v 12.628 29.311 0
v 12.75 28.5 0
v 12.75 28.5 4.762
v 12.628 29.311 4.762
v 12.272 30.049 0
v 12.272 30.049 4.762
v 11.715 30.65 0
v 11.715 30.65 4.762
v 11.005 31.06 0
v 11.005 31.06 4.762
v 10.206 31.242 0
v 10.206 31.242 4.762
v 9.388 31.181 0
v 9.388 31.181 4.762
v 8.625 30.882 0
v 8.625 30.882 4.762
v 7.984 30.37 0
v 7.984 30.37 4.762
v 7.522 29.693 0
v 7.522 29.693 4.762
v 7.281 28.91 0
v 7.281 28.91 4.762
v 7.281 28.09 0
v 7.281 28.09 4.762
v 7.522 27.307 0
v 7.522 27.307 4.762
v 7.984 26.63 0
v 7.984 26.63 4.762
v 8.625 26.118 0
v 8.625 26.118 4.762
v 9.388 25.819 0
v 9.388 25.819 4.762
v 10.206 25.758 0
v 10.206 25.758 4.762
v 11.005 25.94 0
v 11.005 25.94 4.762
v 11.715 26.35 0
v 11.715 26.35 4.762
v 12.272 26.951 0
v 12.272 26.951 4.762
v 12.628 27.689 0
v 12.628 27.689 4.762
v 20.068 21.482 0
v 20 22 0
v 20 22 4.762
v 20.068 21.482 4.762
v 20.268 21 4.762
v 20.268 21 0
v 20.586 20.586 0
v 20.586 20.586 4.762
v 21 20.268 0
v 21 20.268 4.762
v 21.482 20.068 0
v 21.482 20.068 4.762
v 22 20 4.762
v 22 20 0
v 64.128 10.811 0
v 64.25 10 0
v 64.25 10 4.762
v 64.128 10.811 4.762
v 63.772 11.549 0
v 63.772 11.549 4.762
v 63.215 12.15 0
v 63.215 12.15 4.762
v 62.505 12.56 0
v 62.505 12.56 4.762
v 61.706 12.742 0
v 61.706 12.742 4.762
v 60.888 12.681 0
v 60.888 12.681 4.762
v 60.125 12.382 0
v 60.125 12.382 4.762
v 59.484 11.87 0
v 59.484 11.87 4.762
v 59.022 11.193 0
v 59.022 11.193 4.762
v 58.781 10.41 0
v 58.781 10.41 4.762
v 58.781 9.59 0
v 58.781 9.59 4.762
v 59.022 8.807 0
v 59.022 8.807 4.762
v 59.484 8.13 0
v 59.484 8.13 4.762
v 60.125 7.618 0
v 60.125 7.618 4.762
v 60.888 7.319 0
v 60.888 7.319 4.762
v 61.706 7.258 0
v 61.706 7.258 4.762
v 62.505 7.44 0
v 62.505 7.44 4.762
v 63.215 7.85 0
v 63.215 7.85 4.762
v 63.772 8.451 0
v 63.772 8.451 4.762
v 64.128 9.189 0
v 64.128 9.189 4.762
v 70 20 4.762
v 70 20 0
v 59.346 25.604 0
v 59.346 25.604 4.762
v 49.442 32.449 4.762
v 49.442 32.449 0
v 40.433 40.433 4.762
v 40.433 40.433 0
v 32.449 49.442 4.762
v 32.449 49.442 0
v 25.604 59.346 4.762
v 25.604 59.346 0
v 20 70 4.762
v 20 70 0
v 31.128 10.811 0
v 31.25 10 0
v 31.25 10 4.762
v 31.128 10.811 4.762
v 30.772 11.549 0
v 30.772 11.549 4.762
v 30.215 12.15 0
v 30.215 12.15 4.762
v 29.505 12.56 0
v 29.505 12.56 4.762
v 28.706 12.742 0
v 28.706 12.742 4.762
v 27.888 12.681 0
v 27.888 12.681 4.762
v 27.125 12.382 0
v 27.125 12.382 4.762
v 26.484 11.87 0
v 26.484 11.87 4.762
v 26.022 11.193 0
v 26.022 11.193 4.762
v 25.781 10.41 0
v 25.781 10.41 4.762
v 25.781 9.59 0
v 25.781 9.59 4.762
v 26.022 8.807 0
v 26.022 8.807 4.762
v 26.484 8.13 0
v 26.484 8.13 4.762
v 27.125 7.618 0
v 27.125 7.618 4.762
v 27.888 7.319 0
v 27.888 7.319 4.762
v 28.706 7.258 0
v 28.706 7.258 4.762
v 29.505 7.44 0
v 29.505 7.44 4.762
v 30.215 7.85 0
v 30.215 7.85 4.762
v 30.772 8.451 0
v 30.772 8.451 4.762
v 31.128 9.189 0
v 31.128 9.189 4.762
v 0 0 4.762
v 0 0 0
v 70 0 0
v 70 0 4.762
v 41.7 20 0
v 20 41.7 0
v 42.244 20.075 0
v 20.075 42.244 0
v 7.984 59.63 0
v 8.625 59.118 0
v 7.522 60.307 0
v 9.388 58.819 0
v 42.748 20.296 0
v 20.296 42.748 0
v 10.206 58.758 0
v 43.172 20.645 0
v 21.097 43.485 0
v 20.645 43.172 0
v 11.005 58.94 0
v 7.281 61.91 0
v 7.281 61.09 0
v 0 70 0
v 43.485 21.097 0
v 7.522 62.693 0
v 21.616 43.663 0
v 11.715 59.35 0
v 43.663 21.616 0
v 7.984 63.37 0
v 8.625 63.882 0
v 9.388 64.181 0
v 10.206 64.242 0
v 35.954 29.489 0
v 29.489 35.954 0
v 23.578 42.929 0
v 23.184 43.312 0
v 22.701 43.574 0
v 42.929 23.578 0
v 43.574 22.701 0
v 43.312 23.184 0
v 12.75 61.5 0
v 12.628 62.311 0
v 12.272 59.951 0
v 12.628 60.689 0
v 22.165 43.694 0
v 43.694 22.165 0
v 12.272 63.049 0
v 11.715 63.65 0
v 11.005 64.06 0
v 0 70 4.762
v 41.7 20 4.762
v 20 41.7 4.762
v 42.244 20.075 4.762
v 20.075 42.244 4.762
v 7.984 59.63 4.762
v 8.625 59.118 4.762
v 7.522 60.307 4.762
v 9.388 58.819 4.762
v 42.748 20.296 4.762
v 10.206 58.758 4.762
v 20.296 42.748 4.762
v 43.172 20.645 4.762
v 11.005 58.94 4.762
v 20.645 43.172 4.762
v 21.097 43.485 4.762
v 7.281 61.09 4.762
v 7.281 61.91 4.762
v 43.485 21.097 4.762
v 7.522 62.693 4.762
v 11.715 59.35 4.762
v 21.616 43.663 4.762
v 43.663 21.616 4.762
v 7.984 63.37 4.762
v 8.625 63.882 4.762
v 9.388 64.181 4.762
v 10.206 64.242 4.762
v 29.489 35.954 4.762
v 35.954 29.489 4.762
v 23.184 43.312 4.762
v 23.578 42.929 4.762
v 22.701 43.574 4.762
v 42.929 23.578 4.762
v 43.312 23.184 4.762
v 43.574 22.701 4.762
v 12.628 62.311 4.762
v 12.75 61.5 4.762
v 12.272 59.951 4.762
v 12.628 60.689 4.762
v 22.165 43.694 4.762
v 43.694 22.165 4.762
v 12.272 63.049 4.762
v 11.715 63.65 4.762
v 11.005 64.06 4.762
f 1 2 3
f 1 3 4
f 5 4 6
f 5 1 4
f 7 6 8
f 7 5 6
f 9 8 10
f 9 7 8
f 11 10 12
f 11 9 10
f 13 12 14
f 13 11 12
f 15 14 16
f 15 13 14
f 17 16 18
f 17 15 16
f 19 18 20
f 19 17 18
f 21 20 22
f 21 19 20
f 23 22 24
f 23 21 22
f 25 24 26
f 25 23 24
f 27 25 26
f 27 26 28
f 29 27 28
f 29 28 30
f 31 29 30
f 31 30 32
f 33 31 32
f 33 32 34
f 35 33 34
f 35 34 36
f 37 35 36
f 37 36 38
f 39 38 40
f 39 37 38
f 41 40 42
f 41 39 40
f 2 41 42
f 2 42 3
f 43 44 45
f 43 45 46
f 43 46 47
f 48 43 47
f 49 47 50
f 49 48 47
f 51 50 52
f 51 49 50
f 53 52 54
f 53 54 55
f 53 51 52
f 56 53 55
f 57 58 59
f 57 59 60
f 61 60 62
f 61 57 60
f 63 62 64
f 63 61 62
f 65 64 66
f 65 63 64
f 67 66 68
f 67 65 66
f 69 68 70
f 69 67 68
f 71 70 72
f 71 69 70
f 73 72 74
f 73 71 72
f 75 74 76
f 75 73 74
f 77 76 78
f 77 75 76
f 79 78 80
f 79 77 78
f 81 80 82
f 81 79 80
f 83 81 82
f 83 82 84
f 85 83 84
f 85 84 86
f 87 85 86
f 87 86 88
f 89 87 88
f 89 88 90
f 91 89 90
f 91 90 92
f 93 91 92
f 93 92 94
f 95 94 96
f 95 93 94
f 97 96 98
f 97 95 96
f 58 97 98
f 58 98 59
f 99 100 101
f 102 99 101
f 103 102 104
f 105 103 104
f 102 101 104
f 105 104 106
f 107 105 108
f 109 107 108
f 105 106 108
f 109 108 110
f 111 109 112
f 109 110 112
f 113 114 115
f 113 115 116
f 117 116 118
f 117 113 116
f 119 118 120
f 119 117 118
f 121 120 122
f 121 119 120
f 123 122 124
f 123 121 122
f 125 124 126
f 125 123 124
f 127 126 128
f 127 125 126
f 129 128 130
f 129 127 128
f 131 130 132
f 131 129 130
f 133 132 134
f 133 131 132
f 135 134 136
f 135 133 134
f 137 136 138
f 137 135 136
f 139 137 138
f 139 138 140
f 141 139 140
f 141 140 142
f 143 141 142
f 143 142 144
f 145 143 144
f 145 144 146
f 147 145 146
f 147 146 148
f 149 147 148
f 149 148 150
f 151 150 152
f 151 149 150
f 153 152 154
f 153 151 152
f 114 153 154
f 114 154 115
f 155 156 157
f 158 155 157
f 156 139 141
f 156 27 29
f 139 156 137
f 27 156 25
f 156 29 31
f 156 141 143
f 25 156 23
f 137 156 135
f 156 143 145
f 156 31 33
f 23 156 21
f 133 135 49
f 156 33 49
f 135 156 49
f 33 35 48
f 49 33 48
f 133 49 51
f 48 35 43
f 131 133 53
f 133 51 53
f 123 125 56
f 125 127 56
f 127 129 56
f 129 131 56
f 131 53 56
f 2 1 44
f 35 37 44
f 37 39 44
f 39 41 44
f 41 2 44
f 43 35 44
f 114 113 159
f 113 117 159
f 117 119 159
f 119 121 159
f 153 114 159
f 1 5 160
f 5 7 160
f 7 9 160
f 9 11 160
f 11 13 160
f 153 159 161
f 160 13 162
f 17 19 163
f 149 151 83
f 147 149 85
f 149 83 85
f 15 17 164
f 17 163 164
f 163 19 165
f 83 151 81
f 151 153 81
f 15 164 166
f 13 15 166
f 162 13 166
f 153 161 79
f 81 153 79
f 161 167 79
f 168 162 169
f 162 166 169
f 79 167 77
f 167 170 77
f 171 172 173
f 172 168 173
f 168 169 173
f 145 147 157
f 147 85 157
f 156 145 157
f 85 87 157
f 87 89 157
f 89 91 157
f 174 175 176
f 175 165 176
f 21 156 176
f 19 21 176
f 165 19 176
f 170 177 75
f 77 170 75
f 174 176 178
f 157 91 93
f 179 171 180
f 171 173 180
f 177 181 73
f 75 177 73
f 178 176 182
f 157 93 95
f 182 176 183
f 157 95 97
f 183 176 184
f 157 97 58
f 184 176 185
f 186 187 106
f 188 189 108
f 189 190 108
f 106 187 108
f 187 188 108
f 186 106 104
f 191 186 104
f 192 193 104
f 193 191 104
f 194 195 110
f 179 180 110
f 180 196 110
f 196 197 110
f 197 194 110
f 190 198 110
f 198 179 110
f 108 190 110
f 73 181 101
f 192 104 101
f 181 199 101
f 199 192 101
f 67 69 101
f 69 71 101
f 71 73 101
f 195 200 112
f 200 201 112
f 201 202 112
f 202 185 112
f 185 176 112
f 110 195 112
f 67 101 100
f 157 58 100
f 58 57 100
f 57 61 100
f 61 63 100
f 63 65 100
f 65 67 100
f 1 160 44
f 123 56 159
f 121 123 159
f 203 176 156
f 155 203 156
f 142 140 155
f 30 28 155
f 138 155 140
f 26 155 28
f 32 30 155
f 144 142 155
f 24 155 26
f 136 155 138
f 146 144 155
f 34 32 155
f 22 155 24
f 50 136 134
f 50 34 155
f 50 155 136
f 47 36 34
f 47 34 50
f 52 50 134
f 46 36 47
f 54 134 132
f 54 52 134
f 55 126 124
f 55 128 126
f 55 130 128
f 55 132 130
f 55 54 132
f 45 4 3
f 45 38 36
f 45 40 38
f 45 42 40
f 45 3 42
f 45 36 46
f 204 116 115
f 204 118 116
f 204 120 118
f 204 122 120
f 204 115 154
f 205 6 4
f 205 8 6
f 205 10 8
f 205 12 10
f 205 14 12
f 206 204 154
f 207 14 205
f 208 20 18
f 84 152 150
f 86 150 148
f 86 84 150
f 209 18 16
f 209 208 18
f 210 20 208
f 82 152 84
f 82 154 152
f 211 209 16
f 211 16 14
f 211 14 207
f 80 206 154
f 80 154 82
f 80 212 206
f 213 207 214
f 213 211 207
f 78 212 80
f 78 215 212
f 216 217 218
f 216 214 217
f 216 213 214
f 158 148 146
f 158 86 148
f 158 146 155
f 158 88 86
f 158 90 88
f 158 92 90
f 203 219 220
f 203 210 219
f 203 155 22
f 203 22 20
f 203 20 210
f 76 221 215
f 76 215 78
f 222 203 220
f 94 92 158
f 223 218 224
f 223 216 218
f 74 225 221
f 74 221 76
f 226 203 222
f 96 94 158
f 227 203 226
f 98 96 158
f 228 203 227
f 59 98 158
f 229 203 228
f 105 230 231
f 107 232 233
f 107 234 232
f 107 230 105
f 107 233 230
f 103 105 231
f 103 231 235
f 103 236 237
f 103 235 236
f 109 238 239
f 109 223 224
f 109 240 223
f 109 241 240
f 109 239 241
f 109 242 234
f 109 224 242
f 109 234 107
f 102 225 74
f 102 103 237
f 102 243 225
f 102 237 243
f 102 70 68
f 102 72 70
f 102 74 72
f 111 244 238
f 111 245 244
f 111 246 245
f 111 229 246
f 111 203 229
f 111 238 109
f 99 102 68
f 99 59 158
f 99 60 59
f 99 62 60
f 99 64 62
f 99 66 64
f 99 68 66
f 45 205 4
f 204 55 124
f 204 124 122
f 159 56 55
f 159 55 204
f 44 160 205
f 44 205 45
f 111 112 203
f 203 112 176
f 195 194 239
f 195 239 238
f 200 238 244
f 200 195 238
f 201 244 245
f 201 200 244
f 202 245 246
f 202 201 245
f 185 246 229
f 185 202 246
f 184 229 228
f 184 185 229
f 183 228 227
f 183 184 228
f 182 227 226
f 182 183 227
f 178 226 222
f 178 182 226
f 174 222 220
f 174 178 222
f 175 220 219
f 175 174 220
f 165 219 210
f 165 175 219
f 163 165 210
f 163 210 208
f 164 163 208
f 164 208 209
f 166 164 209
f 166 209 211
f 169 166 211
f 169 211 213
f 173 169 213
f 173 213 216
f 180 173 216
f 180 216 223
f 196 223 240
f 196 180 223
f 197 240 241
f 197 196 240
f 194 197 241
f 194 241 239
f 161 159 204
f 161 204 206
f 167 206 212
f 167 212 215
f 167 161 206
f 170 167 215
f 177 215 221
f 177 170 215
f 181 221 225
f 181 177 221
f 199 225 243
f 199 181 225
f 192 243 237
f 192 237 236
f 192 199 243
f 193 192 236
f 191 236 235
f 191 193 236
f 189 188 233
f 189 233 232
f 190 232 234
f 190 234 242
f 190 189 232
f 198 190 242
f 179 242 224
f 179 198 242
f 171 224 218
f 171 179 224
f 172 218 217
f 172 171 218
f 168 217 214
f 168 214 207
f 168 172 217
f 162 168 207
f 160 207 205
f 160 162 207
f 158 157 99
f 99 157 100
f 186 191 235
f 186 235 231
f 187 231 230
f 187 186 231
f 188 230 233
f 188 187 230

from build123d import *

# Parameters (mm, degrees)
SKETCH1_R           = 2.75
BOSS_EXTRUDE1_DEPTH = 4.7625


with BuildPart() as part:
    # Sketch1 → Boss-Extrude1 (new body)
    with BuildSketch(Plane.XY):
        with BuildLine():
            Line((0, 0), (70, 0))
            Line((70, 0), (70, 20))
            ThreePointArc((70, 20), (40.433104658, 40.433104658), (20, 70))
            Line((20, 70), (0, 70))
            Line((0, 70), (0, 0))
        make_face()
        with Locations((10, 61.5)):
            Circle(SKETCH1_R, mode=Mode.SUBTRACT)
        with Locations((10, 28.5)):
            Circle(SKETCH1_R, mode=Mode.SUBTRACT)
        with Locations((28.5, 10)):
            Circle(SKETCH1_R, mode=Mode.SUBTRACT)
        with Locations((61.5, 10)):
            Circle(SKETCH1_R, mode=Mode.SUBTRACT)
        with BuildLine():
            Line((20, 41.700381418), (20, 22))
            ThreePointArc((20, 22), (20.585786438, 20.585786438), (22, 20))
            Line((22, 20), (41.700381418, 20))
            ThreePointArc((41.700381418, 20), (43.591879783, 21.350204699), (42.929468168, 23.577766067))
            ThreePointArc((42.929468168, 23.577766067), (32.654930065, 32.654930065), (23.577766067, 42.929468168))
            ThreePointArc((23.577766067, 42.929468168), (21.350204699, 43.591879783), (20, 41.700381418))
        make_face(mode=Mode.SUBTRACT)
    extrude(amount=BOSS_EXTRUDE1_DEPTH)


solid = part.part
